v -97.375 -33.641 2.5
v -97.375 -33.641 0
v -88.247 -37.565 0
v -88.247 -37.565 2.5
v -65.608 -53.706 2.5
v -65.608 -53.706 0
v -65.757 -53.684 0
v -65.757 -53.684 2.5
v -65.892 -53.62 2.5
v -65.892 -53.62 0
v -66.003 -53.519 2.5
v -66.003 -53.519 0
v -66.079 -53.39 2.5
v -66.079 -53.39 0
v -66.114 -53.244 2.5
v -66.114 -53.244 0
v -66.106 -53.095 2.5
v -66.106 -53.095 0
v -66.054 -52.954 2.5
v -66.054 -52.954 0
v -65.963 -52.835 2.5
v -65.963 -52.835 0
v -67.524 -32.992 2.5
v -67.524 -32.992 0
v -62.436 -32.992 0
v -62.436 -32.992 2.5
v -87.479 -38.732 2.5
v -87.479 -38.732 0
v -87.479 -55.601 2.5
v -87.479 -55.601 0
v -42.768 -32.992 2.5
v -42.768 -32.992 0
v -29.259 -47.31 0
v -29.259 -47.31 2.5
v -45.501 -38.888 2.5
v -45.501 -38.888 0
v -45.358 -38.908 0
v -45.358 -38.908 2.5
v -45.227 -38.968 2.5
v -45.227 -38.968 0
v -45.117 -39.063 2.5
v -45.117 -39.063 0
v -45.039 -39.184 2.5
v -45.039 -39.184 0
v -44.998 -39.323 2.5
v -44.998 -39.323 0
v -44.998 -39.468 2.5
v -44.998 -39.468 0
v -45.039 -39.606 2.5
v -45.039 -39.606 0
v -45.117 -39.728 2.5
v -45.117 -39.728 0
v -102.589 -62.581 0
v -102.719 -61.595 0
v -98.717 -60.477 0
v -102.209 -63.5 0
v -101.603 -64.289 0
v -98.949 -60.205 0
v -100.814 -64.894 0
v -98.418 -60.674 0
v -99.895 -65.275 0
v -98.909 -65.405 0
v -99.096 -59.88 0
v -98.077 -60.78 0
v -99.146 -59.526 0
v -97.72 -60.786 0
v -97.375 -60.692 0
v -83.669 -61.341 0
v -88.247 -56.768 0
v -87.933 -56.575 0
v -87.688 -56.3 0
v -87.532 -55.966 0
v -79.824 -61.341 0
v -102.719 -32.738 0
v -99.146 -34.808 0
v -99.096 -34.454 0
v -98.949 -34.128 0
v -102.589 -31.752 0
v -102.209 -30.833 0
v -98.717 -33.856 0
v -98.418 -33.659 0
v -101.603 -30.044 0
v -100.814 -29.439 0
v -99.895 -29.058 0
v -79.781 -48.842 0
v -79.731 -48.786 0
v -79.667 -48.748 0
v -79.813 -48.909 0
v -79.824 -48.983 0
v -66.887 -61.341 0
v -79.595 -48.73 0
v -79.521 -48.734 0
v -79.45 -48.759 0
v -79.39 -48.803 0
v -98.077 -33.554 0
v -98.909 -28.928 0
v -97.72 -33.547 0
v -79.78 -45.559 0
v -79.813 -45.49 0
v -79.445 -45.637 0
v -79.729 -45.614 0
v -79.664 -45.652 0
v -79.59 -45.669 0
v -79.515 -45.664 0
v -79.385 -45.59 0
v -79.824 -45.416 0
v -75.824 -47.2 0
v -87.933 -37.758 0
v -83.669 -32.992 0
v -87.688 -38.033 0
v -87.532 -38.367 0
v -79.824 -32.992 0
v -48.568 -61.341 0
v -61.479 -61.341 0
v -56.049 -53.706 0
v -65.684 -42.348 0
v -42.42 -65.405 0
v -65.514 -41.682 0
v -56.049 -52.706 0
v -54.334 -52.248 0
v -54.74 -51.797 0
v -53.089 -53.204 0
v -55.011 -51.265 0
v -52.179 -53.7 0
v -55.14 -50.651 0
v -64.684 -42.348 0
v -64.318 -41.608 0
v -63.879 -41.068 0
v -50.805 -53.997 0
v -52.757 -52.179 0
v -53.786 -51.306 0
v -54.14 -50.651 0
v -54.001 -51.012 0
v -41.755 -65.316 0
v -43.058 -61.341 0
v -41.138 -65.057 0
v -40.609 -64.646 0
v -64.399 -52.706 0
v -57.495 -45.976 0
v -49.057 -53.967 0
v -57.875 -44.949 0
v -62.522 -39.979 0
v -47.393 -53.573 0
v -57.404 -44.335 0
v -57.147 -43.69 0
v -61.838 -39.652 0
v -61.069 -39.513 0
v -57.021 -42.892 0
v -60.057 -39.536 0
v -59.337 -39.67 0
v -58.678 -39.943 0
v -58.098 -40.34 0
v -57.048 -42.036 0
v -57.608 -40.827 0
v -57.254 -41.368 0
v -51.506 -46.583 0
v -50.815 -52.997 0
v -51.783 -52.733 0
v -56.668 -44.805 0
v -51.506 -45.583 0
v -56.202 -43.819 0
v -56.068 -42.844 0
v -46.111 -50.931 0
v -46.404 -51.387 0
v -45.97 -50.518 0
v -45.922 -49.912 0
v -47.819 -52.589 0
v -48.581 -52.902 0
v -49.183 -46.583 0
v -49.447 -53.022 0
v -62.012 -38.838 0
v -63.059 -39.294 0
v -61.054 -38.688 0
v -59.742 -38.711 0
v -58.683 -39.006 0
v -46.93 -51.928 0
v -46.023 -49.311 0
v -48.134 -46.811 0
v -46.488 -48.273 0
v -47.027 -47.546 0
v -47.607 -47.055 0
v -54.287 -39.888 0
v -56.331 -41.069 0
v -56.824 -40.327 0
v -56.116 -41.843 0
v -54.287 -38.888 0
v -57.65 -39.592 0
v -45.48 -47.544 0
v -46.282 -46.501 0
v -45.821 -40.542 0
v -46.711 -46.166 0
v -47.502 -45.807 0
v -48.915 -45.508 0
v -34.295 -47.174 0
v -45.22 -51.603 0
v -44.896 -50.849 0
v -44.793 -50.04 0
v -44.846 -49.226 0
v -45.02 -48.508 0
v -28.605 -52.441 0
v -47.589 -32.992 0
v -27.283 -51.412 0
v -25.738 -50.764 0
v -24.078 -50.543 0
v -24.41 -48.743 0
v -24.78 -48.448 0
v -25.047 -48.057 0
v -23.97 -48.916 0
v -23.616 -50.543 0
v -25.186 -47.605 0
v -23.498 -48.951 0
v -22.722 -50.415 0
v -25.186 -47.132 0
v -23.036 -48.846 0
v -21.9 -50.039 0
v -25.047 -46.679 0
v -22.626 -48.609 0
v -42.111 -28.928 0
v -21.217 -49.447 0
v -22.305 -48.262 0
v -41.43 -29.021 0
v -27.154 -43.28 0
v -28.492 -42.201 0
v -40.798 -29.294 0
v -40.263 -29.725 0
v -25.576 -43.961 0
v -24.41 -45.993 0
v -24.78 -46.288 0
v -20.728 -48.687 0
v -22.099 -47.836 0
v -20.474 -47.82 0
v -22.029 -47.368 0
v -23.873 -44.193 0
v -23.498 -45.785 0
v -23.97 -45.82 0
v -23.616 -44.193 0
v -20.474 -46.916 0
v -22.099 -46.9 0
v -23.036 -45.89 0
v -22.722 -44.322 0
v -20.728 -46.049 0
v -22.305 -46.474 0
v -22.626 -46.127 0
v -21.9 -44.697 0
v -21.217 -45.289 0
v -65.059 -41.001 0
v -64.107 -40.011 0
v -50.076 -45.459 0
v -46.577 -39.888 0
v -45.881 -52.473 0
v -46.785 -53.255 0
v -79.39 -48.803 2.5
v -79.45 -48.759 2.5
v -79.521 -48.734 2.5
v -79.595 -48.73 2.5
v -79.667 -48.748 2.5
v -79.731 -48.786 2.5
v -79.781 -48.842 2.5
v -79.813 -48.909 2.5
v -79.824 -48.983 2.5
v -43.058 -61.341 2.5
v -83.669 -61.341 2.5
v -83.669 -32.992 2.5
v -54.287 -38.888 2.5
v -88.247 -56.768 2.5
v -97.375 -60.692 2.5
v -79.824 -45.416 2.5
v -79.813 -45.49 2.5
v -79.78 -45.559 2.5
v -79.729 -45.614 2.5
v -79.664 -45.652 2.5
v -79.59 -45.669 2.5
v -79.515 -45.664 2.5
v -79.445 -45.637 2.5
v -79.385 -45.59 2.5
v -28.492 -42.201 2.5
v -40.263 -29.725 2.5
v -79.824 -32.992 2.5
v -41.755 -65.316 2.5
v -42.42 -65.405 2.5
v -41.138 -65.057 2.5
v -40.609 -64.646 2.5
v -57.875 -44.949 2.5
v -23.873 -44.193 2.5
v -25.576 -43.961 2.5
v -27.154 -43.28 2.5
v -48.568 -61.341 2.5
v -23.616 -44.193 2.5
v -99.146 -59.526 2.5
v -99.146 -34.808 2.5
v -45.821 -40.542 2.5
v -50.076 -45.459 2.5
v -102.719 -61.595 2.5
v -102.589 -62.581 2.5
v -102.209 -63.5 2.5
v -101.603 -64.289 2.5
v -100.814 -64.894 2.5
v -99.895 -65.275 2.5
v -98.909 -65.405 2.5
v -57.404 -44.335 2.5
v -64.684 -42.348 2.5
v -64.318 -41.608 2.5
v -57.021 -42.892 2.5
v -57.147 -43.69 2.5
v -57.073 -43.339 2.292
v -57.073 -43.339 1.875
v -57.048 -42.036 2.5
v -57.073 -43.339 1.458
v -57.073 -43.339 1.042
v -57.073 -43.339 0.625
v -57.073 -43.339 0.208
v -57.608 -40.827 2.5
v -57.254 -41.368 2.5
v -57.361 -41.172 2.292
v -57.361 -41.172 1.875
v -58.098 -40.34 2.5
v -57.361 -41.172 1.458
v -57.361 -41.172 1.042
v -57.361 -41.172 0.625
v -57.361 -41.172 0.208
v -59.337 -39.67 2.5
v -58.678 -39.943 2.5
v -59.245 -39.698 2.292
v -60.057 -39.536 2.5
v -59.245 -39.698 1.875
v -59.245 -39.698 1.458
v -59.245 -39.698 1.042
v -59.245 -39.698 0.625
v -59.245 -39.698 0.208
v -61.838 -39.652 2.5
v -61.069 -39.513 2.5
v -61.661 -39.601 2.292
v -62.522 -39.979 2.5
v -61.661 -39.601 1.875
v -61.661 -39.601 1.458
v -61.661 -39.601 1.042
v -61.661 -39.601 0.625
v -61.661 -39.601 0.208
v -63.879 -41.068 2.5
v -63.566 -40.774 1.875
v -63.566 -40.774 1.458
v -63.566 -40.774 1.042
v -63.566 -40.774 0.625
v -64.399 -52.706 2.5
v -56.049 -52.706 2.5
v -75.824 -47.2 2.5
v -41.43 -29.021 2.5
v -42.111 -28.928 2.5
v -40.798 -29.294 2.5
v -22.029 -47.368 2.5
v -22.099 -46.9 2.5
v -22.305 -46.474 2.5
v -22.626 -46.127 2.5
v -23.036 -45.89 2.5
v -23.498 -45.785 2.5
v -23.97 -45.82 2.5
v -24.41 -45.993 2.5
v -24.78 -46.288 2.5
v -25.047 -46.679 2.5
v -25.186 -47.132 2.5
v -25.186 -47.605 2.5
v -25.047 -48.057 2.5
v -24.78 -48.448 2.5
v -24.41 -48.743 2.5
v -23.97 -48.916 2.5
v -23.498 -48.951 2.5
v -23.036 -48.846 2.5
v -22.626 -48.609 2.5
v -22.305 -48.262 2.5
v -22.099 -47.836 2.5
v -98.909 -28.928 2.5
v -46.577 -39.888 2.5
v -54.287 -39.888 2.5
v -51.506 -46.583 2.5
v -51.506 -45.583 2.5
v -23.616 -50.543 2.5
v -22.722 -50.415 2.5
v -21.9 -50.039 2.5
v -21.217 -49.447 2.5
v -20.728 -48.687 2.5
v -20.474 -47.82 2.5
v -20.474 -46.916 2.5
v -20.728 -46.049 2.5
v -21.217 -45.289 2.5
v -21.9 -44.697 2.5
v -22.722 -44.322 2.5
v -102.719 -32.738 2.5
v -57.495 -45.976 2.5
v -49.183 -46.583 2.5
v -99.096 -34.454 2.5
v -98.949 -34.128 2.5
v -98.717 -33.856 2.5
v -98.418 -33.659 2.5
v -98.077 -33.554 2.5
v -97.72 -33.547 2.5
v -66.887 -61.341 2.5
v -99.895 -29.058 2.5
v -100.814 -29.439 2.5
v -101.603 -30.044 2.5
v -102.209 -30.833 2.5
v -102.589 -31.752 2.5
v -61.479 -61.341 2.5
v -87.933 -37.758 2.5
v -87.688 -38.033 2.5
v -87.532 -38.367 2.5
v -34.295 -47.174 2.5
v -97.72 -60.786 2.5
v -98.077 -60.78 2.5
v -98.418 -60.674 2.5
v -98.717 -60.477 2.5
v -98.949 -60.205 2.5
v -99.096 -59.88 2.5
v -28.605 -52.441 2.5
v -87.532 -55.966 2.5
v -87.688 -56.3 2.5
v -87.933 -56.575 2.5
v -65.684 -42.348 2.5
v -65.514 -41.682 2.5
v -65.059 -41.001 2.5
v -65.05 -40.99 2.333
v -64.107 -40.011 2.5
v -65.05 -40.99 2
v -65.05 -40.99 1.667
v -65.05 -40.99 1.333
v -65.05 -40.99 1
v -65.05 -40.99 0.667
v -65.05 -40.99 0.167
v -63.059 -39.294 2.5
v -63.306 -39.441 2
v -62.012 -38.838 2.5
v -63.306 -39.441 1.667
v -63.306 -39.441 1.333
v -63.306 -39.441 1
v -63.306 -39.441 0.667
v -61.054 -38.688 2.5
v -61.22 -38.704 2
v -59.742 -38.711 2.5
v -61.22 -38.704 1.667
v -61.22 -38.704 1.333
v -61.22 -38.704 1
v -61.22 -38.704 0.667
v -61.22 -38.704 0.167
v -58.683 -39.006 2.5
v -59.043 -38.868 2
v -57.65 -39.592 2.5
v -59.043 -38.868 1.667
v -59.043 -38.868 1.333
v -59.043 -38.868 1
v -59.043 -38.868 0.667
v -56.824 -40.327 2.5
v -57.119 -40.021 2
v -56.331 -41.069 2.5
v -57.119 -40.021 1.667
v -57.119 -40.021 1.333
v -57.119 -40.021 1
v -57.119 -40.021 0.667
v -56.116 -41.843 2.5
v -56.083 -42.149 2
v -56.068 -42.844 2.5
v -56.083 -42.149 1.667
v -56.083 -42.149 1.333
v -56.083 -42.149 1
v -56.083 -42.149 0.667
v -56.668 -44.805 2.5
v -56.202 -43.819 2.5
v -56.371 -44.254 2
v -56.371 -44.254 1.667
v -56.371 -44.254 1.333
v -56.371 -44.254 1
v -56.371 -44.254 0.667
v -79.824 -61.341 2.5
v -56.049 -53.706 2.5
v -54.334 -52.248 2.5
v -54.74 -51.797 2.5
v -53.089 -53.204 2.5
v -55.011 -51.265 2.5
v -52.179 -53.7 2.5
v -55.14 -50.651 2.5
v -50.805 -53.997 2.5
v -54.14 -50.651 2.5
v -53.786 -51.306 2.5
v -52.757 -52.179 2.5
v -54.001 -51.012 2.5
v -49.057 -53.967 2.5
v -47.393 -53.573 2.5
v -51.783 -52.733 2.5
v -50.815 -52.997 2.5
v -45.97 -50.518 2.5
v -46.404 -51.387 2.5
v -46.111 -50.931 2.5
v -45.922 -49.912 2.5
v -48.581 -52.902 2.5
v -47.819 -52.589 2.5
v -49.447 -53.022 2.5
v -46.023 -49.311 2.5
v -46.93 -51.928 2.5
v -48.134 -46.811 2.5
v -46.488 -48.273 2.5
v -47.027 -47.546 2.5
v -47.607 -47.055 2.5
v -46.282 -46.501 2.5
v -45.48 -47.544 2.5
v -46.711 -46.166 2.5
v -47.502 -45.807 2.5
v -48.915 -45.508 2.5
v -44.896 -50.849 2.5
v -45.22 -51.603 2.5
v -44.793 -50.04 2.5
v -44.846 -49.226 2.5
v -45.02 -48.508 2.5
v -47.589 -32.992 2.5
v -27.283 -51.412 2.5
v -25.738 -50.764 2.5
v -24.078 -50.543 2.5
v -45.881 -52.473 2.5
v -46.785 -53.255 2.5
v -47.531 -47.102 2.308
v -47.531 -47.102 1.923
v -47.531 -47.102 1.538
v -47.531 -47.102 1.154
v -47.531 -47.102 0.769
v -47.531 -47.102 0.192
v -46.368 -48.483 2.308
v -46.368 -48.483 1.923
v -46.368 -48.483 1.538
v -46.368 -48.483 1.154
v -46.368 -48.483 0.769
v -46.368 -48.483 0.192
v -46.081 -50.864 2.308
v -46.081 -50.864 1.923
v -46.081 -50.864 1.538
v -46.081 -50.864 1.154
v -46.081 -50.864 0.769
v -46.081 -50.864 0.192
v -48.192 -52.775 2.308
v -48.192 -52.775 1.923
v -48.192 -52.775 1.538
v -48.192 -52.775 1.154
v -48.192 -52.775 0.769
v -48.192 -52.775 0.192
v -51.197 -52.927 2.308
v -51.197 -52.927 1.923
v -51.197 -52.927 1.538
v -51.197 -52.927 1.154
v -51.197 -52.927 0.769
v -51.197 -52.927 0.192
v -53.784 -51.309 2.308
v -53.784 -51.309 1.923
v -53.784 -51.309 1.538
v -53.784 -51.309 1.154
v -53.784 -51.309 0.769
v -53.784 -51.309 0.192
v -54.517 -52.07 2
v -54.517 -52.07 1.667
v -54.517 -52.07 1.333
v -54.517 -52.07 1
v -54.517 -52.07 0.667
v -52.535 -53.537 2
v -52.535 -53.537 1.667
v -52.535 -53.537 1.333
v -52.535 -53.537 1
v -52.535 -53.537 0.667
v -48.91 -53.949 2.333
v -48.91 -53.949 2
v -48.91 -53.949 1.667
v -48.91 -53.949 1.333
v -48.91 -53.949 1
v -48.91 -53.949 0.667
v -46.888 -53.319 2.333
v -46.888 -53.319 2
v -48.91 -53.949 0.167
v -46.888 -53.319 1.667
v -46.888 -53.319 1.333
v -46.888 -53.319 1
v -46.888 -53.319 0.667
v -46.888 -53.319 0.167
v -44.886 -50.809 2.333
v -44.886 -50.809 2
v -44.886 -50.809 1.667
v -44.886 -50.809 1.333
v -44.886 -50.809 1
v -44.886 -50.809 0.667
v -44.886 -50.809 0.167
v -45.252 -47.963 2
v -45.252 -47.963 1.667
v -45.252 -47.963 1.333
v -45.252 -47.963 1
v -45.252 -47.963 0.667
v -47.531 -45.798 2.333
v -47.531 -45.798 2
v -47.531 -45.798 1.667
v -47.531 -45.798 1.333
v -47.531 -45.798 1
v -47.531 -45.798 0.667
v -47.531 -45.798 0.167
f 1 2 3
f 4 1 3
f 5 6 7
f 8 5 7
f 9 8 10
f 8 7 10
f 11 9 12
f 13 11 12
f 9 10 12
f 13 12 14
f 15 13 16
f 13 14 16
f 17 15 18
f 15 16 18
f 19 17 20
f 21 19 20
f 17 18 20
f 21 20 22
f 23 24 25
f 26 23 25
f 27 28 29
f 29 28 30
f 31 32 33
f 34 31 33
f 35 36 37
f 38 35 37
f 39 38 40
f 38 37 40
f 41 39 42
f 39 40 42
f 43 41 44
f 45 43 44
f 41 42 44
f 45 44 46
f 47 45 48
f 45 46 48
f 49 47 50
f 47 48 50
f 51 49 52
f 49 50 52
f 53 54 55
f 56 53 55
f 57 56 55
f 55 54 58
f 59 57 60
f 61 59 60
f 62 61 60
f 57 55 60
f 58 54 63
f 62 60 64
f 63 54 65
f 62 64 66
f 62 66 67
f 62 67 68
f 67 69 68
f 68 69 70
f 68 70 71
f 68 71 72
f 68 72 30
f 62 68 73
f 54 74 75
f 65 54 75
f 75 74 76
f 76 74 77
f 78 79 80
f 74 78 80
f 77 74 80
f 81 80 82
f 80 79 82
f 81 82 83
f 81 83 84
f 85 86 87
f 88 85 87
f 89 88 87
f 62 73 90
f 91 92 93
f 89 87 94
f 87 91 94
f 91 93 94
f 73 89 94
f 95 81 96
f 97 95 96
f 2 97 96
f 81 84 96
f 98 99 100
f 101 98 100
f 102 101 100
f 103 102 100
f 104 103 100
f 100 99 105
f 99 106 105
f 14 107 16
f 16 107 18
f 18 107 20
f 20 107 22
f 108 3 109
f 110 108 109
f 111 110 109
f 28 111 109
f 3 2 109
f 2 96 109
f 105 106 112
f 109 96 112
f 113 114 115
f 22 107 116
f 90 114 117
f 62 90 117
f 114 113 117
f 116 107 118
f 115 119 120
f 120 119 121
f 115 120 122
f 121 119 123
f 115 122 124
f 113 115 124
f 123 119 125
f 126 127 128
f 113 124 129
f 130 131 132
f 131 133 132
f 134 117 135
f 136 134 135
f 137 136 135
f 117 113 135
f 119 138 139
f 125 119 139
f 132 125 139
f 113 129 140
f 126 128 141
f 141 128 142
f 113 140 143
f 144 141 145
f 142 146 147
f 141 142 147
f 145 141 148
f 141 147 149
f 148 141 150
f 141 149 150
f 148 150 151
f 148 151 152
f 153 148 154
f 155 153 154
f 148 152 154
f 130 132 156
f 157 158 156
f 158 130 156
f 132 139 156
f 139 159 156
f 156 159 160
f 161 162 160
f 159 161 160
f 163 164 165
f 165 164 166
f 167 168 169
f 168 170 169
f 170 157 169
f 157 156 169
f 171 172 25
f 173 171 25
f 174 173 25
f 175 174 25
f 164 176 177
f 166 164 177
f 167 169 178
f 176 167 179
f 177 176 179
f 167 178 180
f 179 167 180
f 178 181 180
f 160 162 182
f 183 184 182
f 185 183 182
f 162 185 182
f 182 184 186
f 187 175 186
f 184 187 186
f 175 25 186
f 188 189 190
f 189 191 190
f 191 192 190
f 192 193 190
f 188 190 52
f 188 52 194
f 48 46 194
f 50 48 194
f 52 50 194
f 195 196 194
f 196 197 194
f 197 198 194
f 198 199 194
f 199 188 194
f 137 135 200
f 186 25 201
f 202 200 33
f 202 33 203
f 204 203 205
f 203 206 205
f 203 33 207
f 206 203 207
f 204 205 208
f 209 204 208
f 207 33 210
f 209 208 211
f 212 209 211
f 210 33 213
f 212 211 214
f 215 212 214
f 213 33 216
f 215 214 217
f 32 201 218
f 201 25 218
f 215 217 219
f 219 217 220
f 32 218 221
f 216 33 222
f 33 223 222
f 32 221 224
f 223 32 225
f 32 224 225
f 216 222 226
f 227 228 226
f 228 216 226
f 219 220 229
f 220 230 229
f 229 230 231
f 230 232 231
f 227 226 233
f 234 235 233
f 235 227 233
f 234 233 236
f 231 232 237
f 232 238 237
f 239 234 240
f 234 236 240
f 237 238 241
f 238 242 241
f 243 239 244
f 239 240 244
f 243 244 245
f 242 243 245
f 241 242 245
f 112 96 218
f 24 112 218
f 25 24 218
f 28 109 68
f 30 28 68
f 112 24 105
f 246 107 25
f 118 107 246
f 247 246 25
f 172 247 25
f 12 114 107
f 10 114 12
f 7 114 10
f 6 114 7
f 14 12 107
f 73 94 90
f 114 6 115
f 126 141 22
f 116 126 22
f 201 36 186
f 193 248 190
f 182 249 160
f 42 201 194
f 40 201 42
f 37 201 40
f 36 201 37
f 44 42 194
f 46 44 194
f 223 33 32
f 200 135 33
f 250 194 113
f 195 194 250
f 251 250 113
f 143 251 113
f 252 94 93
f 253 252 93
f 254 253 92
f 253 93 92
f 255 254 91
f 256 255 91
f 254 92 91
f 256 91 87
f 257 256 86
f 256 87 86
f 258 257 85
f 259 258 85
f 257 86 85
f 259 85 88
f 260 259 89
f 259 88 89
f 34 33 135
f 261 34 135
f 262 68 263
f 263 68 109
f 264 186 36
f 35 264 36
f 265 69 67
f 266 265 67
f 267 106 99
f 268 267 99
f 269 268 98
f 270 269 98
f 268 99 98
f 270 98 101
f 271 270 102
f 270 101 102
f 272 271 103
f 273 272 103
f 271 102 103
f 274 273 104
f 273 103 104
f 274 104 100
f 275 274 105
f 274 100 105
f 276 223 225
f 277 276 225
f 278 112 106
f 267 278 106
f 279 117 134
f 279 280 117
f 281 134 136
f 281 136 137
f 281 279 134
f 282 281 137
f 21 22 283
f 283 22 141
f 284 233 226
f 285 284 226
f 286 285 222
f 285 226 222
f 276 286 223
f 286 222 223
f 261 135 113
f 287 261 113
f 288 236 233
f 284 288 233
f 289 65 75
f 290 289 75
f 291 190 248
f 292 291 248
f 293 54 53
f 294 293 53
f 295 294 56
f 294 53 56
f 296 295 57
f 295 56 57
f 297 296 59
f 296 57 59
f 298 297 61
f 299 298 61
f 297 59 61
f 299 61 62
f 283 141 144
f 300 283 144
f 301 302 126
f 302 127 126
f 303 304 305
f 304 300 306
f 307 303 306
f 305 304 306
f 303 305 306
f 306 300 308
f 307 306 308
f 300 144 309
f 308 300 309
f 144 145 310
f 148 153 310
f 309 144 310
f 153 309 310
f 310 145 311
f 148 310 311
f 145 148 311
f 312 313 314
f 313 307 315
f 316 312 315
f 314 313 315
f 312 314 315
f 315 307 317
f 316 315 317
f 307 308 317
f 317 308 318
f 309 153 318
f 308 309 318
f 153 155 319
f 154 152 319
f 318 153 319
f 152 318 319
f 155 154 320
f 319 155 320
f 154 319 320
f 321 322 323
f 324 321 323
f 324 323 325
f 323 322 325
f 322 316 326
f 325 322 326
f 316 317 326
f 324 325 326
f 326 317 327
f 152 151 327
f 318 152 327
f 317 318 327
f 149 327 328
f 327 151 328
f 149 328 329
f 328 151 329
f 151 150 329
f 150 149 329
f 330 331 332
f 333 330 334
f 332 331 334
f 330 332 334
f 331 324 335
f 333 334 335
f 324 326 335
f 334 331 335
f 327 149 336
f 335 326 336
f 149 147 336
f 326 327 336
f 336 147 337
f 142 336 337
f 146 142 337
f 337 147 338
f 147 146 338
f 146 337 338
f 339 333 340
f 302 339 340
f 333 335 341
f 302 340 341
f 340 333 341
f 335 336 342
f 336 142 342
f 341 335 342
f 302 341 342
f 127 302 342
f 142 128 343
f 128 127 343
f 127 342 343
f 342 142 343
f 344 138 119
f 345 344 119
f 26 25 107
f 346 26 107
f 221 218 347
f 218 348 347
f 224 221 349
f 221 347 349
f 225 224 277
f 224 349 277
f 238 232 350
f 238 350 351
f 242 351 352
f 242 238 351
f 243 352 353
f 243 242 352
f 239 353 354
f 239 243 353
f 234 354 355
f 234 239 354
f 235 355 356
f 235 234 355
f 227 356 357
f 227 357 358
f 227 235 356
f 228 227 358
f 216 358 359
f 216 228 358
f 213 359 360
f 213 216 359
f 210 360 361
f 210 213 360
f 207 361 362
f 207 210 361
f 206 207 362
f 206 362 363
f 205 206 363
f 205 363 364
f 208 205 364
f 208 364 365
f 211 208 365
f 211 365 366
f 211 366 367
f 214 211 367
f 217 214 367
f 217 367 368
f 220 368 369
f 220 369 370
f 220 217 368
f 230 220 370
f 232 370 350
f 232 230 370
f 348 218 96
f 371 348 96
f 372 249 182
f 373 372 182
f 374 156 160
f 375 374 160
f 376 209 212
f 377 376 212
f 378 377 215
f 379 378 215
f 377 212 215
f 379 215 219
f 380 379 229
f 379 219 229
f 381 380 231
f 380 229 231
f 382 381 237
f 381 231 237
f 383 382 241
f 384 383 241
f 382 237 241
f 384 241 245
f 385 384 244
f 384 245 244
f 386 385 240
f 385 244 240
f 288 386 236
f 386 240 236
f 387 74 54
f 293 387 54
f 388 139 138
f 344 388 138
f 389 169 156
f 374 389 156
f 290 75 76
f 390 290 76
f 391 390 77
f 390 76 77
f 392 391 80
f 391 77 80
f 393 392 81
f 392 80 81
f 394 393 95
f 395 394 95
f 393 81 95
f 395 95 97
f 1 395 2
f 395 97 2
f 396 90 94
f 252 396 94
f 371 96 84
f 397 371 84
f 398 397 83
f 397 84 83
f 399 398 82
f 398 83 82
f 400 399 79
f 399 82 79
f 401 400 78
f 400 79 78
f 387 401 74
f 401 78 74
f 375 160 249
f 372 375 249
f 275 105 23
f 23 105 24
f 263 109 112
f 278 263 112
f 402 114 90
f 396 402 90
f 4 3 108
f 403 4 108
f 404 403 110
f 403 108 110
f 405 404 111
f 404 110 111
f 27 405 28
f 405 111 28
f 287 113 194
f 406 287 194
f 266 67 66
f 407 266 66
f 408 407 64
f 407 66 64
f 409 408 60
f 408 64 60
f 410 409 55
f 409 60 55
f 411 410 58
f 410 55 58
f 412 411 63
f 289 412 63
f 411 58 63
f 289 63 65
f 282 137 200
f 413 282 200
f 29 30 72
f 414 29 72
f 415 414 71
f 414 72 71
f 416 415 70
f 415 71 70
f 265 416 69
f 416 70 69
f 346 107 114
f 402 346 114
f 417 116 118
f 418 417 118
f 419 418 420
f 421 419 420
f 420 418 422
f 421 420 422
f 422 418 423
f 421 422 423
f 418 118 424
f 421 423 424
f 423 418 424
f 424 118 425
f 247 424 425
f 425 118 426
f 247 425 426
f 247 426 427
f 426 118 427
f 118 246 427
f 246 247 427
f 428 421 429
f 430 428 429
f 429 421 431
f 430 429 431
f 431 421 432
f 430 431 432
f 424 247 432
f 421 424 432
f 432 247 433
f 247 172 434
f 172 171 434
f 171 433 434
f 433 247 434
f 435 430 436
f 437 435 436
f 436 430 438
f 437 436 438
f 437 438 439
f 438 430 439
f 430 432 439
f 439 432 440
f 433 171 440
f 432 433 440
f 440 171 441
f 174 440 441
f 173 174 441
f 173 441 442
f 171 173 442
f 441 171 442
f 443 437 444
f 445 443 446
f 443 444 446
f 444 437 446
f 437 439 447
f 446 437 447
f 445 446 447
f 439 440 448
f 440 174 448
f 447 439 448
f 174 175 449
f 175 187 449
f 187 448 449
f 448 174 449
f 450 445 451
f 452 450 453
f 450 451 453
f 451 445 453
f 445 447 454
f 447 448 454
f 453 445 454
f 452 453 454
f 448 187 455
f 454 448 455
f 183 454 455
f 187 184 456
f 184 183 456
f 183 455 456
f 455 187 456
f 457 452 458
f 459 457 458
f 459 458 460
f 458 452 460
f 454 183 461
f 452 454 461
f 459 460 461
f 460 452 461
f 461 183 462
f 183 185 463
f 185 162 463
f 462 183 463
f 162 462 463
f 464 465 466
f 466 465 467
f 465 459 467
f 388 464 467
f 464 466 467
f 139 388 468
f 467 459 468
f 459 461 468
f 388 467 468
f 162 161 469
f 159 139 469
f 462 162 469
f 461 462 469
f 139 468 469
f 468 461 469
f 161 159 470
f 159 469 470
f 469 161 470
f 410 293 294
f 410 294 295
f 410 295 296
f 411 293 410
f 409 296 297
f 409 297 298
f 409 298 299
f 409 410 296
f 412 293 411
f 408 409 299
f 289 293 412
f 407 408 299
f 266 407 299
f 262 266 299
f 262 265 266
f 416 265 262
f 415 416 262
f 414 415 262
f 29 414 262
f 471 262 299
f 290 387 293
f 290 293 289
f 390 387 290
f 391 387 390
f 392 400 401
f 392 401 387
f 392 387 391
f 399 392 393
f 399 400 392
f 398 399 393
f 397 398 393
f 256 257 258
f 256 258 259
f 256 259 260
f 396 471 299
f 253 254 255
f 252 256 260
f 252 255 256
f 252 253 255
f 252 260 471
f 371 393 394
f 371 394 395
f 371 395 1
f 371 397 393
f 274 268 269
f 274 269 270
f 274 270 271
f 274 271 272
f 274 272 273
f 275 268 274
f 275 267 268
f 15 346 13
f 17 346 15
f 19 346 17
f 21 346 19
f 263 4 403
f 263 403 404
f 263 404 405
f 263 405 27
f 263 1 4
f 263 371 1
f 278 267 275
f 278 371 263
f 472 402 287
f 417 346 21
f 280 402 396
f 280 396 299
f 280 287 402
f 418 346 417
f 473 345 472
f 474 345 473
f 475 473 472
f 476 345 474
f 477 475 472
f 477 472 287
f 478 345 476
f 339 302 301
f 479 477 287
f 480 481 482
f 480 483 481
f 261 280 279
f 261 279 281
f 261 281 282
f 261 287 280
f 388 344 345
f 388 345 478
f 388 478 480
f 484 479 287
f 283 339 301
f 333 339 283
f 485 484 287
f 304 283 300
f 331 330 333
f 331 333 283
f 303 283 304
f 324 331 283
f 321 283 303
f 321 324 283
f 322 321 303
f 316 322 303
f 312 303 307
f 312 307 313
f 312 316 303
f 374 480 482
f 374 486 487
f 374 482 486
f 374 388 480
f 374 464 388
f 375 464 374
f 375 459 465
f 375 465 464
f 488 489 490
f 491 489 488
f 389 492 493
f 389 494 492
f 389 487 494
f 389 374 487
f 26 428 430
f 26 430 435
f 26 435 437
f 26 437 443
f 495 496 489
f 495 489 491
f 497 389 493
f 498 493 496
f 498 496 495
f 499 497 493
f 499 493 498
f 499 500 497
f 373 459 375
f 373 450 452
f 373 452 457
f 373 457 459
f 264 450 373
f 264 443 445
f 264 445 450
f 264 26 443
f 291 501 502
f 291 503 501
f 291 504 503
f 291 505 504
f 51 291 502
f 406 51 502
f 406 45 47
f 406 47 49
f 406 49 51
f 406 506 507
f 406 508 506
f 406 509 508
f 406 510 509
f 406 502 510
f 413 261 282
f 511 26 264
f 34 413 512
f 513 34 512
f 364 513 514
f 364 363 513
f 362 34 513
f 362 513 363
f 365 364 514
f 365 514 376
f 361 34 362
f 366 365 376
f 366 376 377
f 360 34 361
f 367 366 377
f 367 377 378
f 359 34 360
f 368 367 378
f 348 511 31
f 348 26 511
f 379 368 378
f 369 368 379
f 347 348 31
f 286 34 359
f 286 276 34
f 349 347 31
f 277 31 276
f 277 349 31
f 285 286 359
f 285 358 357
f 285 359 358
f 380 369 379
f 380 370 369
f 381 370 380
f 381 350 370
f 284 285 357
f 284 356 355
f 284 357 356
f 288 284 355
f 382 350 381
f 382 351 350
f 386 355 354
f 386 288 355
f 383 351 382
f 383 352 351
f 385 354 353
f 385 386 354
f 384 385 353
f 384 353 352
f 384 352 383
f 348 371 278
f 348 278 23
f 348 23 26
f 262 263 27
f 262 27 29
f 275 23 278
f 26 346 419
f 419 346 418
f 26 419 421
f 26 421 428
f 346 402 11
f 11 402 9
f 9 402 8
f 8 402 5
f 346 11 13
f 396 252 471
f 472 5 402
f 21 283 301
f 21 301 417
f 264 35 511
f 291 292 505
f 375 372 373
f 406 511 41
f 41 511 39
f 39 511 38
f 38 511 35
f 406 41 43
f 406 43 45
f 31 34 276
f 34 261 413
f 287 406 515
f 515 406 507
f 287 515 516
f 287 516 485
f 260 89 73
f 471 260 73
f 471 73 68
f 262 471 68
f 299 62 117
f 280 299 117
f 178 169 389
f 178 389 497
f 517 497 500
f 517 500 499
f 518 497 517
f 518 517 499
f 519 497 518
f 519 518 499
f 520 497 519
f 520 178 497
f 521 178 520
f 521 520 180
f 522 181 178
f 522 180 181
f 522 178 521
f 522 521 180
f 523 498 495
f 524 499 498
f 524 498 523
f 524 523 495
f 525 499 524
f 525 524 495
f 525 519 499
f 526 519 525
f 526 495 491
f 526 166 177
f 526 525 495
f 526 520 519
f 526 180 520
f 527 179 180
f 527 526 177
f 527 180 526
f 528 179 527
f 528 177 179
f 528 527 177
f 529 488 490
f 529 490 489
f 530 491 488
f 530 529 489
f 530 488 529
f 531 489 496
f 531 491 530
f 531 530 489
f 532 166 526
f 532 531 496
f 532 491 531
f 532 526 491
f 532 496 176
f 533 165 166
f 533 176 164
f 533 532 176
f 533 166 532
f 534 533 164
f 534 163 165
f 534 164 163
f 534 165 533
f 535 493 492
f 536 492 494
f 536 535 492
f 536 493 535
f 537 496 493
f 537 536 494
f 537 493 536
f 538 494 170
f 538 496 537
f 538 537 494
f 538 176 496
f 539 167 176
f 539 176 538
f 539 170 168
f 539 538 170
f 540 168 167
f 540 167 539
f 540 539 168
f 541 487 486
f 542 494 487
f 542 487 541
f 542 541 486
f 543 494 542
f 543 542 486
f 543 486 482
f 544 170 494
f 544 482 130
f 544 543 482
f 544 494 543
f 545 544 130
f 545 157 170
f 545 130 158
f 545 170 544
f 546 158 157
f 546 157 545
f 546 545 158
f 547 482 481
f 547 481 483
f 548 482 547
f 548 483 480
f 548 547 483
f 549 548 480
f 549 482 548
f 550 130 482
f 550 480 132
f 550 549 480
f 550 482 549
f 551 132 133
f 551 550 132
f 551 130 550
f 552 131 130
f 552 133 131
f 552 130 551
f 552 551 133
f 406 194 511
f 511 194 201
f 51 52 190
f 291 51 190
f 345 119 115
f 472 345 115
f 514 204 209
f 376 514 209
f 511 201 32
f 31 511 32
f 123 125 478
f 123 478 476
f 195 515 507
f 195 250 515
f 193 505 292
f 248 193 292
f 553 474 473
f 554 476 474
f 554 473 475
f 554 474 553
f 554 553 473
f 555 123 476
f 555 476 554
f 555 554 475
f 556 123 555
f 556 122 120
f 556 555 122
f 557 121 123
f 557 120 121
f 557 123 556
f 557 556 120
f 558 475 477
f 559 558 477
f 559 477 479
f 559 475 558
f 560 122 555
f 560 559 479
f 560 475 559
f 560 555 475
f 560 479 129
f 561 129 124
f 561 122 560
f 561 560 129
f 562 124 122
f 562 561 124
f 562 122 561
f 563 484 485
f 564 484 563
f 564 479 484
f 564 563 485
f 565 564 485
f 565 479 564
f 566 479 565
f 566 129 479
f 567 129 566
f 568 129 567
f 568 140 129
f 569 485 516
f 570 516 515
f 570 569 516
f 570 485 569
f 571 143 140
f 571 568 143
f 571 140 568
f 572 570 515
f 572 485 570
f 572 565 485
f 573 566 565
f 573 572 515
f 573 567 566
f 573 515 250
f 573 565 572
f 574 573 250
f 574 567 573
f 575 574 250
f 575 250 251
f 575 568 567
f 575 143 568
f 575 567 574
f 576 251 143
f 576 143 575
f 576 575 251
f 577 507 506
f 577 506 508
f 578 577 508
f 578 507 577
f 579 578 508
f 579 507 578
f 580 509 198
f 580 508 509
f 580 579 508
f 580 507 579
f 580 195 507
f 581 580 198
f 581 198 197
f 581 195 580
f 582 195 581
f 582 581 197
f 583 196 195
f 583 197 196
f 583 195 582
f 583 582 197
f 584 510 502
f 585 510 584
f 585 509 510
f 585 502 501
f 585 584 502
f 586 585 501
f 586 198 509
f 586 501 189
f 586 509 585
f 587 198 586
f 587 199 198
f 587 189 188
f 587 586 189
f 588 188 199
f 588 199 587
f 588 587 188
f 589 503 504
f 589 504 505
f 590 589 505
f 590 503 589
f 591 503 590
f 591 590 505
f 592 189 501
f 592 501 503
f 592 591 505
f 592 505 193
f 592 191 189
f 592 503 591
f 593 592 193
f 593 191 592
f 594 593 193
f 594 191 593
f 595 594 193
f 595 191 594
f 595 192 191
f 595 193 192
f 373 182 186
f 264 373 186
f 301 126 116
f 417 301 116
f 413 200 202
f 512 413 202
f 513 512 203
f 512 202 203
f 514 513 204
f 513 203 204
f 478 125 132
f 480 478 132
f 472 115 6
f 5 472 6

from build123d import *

# Parameters (mm, degrees)
F0_R     = 1.5875
F1_DEPTH = 2.5
F2_R     = 2.54


with BuildPart() as f1:
    # F0 (on Top) → F1 (new body)
    with BuildSketch(Plane.XY):
        with BuildLine():
            Line((-41.0152355528, -28.9283943789), (-83.6689737264, -28.9283943789))
            Line((-83.6689737264, -28.9283943789), (-87.4789737264, -28.9283943789))
            Line((-87.4789737264, -28.9283943789), (-98.9089737264, -28.9283943789))
            ThreePointArc((-98.9089737264, -28.9283943789), (-101.6030505627, -30.0443175425), (-102.7189737264, -32.7383943789))
            Line((-102.7189737264, -32.7383943789), (-102.7189737264, -61.5947266498))
            ThreePointArc((-102.7189737264, -61.5947266498), (-101.6030505627, -64.2888034862), (-98.9089737264, -65.4047266498))
            Line((-98.9089737264, -65.4047266498), (-87.4789737264, -65.4047266498))
            Line((-87.4789737264, -65.4047266498), (-41.3551884672, -65.4047266498))
            Line((-41.3551884672, -65.4047266498), (-28.6049409392, -52.4405066828))
            ThreePointArc((-28.6049409392, -52.4405066828), (-26.5320333811, -51.0366436001), (-24.0776068467, -50.5431178285))
            Line((-24.0776068467, -50.5431178285), (-23.616271076, -50.5431178285))
            ThreePointArc((-23.616271076, -50.5431178285), (-20.441271076, -47.3681178285), (-23.616271076, -44.1931178285))
            Line((-23.616271076, -44.1931178285), (-23.8731620434, -44.1931178285))
            ThreePointArc((-23.8731620434, -44.1931178285), (-26.3881027231, -43.6738616385), (-28.4917367837, -42.2010149553))
            Line((-28.4917367837, -42.2010149553), (-41.0152355528, -28.9283943789))
        make_face()
        with BuildLine():
            Line((-87.4789737264, -38.7319225374), (-87.4789737264, -55.6011984912))
            ThreePointArc((-87.4789737264, -55.6011984912), (-87.6883146152, -56.2996984912), (-88.2473237264, -56.7679235135))
            Line((-88.2473237264, -56.7679235135), (-97.3745739487, -60.6923144255))
            ThreePointArc((-97.3745739487, -60.6923144255), (-98.5747239487, -60.5862485143), (-99.1462239487, -59.5255894032))
            Line((-99.1462239487, -59.5255894032), (-99.1462239487, -34.8075316255))
            ThreePointArc((-99.1462239487, -34.8075316255), (-98.5747239487, -33.7468725144), (-97.3745739487, -33.6408066032))
            Line((-97.3745739487, -33.6408066032), (-88.2473237264, -37.5651975152))
            ThreePointArc((-88.2473237264, -37.5651975152), (-87.6883146152, -38.0334225374), (-87.4789737264, -38.7319225374))
        make_face(mode=Mode.SUBTRACT)
        with Locations((-23.616271076, -47.3681178285)):
            Circle(F0_R, mode=Mode.SUBTRACT)
        with BuildLine():
            Line((-79.8243296973, -61.3407266498), (-83.6689737264, -61.3407266498))
            Line((-83.6689737264, -61.3407266498), (-83.6689737264, -32.9923943789))
            Line((-83.6689737264, -32.9923943789), (-79.8243296973, -32.9923943789))
            Line((-79.8243296973, -32.9923943789), (-79.8243296973, -45.4158016981))
            ThreePointArc((-79.8243296973, -45.4158016981), (-79.663991169, -45.6519023731), (-79.3854042743, -45.5899240342))
            Line((-79.3854042743, -45.5899240342), (-67.5238048367, -32.9923943789))
            Line((-67.5238048367, -32.9923943789), (-62.4358447909, -32.9923943789))
            Line((-62.4358447909, -32.9923943789), (-75.8236845664, -47.2004434557))
            Line((-75.8236845664, -47.2004434557), (-61.4791962959, -61.3407266498))
            Line((-61.4791962959, -61.3407266498), (-66.8869413145, -61.3407266498))
            Line((-66.8869413145, -61.3407266498), (-79.3904819469, -48.8033353869))
            ThreePointArc((-79.3904819469, -48.8033353869), (-79.6673726553, -48.7479665064), (-79.8243296973, -48.9826975531))
            Line((-79.8243296973, -48.9826975531), (-79.8243296973, -61.3407266498))
        make_face(mode=Mode.SUBTRACT)
        with BuildLine():
            Line((-56.0491662414, -52.7064142697), (-56.0491662414, -53.7064142697))
            Line((-56.0491662414, -53.7064142697), (-65.6084735286, -53.7064142697))
            ThreePointArc((-65.6084735286, -53.7064142697), (-66.0790264975, -53.3898402436), (-65.9631036874, -52.8346816063))
            Line((-65.9631036874, -52.8346816063), (-57.8748524364, -44.9488409501))
            add(Edge.make_bspline(
                [(-57.8748524364, -44.9488409501), (-57.6049079559, -44.6730310721), (-57.2910442328, -44.2109427065), (-57.0308173033, -43.3419786526), (-56.9649609015, -42.1059422972), (-57.2966631965, -41.135278444), (-58.1102664249, -40.2494052595), (-59.214207262, -39.6088278482), (-60.5584739912, -39.4710491862), (-61.6751855798, -39.5391321579), (-62.582367941, -39.9651658421), (-63.5788131113, -40.7564134967), (-64.3123788508, -41.4887184359), (-64.5630558851, -42.0690269456), (-64.6835764579, -42.348038143)],
                knots=[0, 0, 0, 0, 0.0777716176, 0.1525772623, 0.2407062995, 0.3208838627, 0.4070461152, 0.4968929668, 0.5893793296, 0.6730011837, 0.7522191079, 0.8422857258, 0.9236075646, 1, 1, 1, 1], degree=3))
            Line((-64.6835764579, -42.348038143), (-65.6835764579, -42.348038143))
            add(Edge.make_bspline(
                [(-65.6835764579, -42.348038143), (-65.6515655123, -42.1421899083), (-65.5820777825, -41.694238449), (-65.0582514394, -40.9627592012), (-64.1794204143, -40.0158728312), (-63.3281081882, -39.4341147601), (-62.2591063744, -38.8400608506), (-61.2194906793, -38.6897793207), (-60.2602251239, -38.6333500559), (-59.0191125498, -38.7882136948), (-57.873134978, -39.415683311), (-57.1009283372, -39.9821708278), (-56.2655215131, -40.9547734855), (-56.0399812771, -42.1269606472), (-56.0716875853, -43.3932037705), (-56.3161760872, -44.2924937446), (-57.0294053116, -45.4197264118), (-57.4954419049, -45.9755554042)],
                knots=[0, 0, 0, 0, 0.0499471301, 0.1091397519, 0.1804215081, 0.2449513234, 0.3137047776, 0.3776027552, 0.438928529, 0.5089179669, 0.5801119853, 0.6419666187, 0.7113707942, 0.7801545863, 0.849417254, 0.9099237356, 1, 1, 1, 1], degree=3))
            Line((-57.4954419049, -45.9755554042), (-64.3990657561, -52.7064142697))
            Line((-64.3990657561, -52.7064142697), (-56.0491662414, -52.7064142697))
        make_face(mode=Mode.SUBTRACT)
        with BuildLine():
            Line((-54.2867301789, -39.8876867653), (-54.2867301789, -38.8876867653))
            Line((-54.2867301789, -38.8876867653), (-45.5011243311, -38.8876867653))
            ThreePointArc((-45.5011243311, -38.8876867653), (-45.0391027641, -39.184499475), (-45.1169783359, -39.7280959324))
            Line((-45.1169783359, -39.7280959324), (-45.821296443, -40.5420355194))
            Line((-45.821296443, -40.5420355194), (-50.0757914916, -45.4587086929))
            add(Edge.make_bspline(
                [(-55.1404660268, -50.6513416474), (-55.1284046046, -50.9186383241), (-54.9653893117, -51.4901529696), (-54.5370885412, -52.1094507073), (-53.7140381482, -52.7578312376), (-52.5435463443, -53.6257710039), (-51.1403303214, -54.0508174033), (-48.8815100408, -54.0440888692), (-46.8253675304, -53.4994028314), (-45.491779462, -52.1008756074), (-44.7578878398, -50.8692584268), (-44.7779583918, -49.1909650381), (-45.1802731622, -47.9556314846), (-46.2051304446, -46.3725933113), (-47.4802688433, -45.7383972623), (-49.0628839063, -45.4526923808), (-49.7646579429, -45.4568607193), (-50.0757914916, -45.4587086929)],
                knots=[0, 0, 0, 0, 0.0511129754, 0.0990891446, 0.1559622878, 0.2229057363, 0.2902636551, 0.373846771, 0.4552028401, 0.5311912045, 0.5975458909, 0.6677145395, 0.7322717578, 0.8071985683, 0.8739396412, 0.9441260045, 1, 1, 1, 1], degree=3))
            Line((-55.1404660268, -50.6513416474), (-54.1404660268, -50.6513416474))
            add(Edge.make_bspline(
                [(-49.1829052277, -46.5828324155), (-48.9268844142, -46.6194922488), (-48.3914715263, -46.6961583908), (-47.4896344277, -47.0473375248), (-46.8541600039, -47.7104967338), (-46.3344533483, -48.4741719236), (-45.8647784487, -49.574264874), (-45.9287442462, -50.9459537276), (-46.9862918054, -52.0396121919), (-48.1631440033, -52.8729201188), (-49.4146488492, -53.0537518116), (-51.2516154736, -53.0702952634), (-52.7087247232, -52.2777887091), (-53.829527649, -51.3371938826), (-54.0618401661, -50.9410469965), (-54.1404660268, -50.6513416474)],
                knots=[0, 0, 0, 0, 0.0629071045, 0.1315027411, 0.1983181189, 0.2658748322, 0.3423216722, 0.4222263447, 0.5078476883, 0.5914521489, 0.6701043426, 0.7643463369, 0.8560118243, 0.9390366353, 1, 1, 1, 1], degree=3))
            Line((-49.1829052277, -46.5828324155), (-51.505612107, -46.5828324155))
            Line((-51.505612107, -46.5828324155), (-51.505612107, -45.5828324155))
            Line((-51.505612107, -45.5828324155), (-46.577489347, -39.8876867653))
            Line((-46.577489347, -39.8876867653), (-54.2867301789, -39.8876867653))
        make_face(mode=Mode.SUBTRACT)
        Polygon((-47.5893848285, -32.9923943789), (-42.7681369416, -32.9923943789), (-29.2589323304, -47.3096830535), (-43.0583957292, -61.3407266498), (-48.5677089251, -61.3407266498), (-34.2946959369, -47.1738673802), align=None, mode=Mode.SUBTRACT)
    extrude(amount=F1_DEPTH)

    # F2
    f2_edges = [f1.edges().sort_by_distance(p)[0] for p in [
        (-41.015236, -28.928394, 1.25),
        (-41.355188, -65.404727, 1.25),
    ]]
    fillet(f2_edges, radius=F2_R)


solid = f1.part
